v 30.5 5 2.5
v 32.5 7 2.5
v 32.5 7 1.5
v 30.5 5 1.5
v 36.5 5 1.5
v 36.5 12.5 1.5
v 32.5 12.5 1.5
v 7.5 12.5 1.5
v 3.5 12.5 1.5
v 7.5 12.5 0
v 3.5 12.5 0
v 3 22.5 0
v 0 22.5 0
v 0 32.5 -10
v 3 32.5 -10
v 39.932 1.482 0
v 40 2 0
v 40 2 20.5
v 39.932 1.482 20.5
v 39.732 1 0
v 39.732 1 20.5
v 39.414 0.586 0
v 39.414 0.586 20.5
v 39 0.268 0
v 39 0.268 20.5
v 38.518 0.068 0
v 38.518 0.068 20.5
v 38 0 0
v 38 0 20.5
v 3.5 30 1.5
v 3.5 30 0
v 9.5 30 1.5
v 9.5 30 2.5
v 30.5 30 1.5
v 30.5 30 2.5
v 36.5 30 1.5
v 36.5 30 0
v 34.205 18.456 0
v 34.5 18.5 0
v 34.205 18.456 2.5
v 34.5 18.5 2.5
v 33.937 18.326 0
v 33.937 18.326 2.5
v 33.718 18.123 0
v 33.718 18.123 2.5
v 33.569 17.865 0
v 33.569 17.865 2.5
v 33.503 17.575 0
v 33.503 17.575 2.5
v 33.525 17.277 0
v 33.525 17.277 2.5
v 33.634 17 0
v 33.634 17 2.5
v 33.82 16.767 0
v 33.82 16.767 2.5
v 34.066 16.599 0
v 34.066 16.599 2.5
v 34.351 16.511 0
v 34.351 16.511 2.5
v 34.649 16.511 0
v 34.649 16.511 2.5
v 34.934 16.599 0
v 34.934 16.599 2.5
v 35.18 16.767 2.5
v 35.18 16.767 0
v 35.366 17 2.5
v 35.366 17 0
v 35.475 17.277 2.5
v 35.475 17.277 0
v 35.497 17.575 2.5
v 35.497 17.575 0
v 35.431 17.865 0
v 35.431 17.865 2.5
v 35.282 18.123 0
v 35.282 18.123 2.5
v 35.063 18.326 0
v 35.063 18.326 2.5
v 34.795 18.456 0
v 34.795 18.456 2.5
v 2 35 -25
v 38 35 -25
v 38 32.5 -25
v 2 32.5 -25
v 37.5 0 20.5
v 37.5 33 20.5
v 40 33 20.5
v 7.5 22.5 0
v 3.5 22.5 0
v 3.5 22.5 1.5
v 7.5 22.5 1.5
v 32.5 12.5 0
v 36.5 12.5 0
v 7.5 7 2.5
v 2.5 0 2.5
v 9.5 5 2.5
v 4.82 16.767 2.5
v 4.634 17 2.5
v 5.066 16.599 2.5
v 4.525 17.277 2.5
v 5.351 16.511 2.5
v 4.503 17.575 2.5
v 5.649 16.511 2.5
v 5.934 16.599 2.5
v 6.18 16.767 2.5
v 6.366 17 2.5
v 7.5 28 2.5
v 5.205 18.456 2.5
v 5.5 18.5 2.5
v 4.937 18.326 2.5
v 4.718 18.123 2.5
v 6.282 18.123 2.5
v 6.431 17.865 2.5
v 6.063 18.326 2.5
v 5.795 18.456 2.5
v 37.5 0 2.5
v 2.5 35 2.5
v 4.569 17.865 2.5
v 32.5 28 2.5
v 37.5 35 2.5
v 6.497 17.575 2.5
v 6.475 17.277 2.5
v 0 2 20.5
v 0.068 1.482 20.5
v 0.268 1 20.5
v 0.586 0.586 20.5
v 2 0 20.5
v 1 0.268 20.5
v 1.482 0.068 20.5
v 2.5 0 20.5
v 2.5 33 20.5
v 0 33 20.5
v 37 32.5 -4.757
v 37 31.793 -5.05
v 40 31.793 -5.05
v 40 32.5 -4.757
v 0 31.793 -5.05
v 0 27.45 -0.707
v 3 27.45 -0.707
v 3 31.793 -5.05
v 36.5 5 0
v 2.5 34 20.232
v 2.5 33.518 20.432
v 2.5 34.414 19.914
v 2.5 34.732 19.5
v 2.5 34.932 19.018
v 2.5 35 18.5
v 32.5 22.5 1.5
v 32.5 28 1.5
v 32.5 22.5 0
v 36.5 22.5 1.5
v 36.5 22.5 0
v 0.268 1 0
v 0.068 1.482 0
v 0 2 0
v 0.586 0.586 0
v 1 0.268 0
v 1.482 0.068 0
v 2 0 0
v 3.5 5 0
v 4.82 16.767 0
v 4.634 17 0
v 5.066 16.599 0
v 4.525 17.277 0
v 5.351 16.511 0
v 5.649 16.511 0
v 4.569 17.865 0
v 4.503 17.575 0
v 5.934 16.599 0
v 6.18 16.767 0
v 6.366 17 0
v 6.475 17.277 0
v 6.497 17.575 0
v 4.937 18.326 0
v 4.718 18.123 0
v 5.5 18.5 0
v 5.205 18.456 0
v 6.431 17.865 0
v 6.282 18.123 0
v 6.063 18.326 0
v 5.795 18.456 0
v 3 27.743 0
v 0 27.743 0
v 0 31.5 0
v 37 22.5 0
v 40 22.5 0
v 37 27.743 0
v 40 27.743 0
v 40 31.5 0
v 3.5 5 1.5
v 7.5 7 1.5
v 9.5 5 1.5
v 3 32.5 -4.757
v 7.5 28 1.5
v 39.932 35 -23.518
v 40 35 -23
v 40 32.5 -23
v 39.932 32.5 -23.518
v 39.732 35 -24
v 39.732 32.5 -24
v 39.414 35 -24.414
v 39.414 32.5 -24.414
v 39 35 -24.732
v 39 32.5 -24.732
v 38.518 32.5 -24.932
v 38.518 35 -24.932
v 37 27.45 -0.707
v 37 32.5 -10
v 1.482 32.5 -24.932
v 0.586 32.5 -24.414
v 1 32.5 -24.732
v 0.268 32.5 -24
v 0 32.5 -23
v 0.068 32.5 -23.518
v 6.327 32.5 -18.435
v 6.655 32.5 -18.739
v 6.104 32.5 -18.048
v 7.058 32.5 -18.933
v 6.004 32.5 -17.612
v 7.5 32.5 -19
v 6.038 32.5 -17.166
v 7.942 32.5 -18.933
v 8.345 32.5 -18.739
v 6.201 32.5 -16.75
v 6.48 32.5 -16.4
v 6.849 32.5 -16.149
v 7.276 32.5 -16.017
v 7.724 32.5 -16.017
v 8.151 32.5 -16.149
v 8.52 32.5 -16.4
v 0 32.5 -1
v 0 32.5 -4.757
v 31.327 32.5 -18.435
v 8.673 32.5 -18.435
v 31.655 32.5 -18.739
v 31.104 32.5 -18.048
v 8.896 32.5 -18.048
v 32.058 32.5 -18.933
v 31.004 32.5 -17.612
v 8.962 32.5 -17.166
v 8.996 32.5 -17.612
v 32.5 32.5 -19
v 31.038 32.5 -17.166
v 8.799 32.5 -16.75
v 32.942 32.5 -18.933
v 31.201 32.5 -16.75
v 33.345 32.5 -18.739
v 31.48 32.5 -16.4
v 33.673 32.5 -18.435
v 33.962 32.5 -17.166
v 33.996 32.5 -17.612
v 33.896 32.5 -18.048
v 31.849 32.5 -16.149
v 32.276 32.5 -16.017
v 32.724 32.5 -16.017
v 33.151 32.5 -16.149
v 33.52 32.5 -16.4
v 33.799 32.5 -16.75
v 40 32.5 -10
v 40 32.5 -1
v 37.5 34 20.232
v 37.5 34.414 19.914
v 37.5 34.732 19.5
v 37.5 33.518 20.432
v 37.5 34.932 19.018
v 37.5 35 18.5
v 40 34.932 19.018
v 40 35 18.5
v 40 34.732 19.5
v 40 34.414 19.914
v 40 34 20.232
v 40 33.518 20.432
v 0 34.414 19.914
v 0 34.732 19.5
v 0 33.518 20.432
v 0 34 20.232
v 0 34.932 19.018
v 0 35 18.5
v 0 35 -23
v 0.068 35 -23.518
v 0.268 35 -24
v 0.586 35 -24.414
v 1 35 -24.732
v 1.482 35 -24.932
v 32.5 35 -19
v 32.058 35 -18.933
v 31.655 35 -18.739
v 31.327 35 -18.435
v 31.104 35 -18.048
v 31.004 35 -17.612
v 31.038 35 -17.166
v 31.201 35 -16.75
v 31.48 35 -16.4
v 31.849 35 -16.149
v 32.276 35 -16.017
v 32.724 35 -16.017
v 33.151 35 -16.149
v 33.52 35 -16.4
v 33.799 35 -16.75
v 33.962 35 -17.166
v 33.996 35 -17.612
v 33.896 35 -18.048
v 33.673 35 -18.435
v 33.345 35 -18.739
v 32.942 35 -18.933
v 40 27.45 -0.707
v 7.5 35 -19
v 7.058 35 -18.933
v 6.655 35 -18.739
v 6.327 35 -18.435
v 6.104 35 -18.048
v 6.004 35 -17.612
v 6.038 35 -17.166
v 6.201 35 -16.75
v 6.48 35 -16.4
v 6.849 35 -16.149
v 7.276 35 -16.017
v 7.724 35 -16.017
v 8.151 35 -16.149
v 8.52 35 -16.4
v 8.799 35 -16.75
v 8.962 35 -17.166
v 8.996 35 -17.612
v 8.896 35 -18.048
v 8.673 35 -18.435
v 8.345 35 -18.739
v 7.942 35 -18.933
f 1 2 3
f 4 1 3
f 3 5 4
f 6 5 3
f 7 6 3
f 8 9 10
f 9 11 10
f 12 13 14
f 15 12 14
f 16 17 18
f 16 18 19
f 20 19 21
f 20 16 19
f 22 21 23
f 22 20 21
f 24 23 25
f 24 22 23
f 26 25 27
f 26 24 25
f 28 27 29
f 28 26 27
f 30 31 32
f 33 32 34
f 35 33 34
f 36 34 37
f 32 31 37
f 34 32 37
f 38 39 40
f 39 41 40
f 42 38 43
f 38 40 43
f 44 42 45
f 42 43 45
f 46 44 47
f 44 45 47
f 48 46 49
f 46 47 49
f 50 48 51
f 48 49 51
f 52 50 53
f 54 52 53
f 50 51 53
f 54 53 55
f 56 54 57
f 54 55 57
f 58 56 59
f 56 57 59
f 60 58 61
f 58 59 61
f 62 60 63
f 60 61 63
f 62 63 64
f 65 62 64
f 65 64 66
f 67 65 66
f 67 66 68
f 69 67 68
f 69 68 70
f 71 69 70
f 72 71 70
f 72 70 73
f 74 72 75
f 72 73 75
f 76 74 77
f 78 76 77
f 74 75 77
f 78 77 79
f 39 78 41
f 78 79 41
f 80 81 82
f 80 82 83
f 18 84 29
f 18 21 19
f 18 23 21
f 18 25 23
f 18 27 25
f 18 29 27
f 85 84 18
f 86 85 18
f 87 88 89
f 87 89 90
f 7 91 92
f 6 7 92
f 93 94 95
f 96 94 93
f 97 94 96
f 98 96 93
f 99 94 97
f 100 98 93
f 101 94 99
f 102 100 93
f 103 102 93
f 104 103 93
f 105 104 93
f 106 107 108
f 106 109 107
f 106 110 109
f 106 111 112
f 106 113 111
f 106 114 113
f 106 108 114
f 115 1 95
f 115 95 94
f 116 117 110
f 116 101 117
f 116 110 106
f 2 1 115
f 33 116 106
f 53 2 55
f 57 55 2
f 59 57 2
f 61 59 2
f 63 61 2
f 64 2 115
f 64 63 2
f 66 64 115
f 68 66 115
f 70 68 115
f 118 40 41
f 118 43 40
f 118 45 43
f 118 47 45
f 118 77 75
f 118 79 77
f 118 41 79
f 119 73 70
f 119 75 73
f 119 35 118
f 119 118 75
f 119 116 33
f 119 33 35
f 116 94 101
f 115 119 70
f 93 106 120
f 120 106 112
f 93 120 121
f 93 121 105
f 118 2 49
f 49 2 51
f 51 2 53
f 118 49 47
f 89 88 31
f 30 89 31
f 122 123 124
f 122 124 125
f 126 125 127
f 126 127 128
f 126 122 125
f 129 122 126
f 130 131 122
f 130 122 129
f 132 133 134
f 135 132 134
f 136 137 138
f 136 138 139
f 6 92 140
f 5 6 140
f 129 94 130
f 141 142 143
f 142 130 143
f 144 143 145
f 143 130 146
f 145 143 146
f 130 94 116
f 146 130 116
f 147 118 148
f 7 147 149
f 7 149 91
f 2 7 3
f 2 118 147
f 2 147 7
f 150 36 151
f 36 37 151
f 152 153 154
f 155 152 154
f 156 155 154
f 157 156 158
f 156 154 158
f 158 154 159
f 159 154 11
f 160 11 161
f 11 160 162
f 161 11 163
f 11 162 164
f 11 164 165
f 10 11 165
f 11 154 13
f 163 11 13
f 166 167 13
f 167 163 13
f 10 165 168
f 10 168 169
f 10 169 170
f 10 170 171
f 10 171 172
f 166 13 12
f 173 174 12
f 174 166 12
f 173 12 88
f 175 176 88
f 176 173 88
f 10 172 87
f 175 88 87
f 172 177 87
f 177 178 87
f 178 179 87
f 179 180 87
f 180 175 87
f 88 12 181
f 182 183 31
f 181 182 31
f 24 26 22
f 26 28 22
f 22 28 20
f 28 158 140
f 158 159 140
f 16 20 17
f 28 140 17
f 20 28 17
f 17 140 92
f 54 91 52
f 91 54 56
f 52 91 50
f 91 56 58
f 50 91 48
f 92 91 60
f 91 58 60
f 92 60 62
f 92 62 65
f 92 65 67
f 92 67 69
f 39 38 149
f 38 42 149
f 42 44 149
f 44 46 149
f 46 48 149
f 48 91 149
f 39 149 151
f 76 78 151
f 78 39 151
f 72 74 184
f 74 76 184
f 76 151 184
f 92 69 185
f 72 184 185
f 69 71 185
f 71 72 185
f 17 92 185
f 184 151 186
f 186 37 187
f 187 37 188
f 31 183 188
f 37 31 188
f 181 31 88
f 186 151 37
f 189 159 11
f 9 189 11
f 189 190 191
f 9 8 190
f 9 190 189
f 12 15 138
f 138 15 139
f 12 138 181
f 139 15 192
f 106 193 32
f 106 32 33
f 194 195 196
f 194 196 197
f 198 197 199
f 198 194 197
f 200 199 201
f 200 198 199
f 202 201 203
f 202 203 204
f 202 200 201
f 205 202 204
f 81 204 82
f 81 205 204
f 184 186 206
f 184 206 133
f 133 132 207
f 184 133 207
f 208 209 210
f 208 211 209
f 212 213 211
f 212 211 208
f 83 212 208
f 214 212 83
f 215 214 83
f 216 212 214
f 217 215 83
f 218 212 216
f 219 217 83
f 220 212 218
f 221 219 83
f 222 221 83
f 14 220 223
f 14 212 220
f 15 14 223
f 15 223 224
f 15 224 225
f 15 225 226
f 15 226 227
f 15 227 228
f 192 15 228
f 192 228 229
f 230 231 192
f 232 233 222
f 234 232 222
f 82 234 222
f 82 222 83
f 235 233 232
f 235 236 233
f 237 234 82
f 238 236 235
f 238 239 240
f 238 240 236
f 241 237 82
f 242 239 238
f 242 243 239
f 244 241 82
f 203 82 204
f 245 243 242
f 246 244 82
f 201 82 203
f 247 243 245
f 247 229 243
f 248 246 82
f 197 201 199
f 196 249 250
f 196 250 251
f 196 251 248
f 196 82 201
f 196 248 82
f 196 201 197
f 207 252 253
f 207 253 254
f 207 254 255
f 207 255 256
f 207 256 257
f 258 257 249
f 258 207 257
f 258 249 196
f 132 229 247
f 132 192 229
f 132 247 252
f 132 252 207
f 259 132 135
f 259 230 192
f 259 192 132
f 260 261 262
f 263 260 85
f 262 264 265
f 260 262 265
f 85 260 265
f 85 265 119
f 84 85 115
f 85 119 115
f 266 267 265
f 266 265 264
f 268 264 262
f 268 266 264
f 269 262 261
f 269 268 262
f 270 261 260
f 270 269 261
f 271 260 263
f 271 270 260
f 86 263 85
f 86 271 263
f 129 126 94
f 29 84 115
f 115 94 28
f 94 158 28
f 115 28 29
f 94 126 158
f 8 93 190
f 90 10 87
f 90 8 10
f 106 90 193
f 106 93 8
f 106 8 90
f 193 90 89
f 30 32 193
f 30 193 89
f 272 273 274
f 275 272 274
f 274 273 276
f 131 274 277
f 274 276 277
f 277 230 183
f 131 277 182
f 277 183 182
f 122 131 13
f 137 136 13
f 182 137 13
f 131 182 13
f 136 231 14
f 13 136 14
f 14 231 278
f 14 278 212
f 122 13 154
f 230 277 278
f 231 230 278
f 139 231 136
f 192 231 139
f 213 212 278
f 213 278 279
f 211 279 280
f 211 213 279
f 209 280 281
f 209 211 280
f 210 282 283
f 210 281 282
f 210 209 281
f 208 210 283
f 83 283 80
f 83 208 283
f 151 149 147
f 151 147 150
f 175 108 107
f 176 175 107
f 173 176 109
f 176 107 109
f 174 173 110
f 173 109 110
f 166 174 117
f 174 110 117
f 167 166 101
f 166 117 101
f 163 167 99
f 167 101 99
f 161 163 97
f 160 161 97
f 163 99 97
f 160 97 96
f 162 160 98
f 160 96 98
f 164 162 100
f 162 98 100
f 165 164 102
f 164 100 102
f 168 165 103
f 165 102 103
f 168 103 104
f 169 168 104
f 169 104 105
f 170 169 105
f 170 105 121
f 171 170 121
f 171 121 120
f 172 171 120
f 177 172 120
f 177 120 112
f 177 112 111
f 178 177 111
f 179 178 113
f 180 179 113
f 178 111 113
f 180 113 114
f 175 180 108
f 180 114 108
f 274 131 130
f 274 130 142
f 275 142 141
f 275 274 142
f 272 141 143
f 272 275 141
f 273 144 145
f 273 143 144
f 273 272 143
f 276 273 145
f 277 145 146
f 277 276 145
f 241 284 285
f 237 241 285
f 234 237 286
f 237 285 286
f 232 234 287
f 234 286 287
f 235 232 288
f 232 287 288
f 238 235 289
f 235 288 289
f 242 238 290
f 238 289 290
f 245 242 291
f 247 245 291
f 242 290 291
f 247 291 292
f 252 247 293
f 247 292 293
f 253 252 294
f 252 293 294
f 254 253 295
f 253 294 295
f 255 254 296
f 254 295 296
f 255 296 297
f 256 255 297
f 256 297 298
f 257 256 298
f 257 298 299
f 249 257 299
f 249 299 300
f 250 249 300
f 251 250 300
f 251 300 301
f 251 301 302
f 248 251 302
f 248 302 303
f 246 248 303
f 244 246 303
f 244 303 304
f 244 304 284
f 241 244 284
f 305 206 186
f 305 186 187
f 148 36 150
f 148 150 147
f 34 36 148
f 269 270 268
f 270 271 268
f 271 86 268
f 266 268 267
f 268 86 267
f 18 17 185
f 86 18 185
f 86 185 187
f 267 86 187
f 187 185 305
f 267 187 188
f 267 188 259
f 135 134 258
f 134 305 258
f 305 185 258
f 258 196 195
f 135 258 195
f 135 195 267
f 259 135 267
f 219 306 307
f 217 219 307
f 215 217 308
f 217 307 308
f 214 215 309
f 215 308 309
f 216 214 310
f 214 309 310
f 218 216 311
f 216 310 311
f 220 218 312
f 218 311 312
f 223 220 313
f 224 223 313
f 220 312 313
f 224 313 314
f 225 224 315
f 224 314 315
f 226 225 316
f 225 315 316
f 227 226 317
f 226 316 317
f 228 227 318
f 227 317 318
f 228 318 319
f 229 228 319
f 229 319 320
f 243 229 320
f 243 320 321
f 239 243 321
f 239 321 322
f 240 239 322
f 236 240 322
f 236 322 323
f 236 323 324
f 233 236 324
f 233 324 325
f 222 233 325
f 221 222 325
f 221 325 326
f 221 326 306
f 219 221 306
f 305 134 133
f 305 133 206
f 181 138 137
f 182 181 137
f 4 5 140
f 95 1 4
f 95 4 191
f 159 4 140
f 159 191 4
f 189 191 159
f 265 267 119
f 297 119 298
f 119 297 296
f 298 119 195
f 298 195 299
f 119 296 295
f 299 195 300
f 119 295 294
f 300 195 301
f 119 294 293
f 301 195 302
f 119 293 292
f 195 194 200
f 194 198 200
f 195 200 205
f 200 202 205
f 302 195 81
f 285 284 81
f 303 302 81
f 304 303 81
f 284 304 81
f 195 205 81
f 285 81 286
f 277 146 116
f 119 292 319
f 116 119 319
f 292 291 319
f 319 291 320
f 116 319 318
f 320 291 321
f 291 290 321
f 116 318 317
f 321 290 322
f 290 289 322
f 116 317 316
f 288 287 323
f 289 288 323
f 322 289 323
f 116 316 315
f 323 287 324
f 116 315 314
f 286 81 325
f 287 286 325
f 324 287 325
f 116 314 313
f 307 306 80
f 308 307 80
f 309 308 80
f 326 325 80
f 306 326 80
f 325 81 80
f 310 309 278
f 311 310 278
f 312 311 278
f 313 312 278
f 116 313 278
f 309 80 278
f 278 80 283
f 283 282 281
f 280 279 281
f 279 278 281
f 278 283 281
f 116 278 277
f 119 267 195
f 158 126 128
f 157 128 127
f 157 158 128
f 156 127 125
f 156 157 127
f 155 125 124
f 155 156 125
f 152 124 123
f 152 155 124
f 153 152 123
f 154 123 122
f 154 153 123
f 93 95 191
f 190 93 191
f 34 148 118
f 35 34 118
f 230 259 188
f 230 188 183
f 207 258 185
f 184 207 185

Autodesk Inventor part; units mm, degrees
ref_plane "YZ Plane" through (0, 0, 0) normal (1, 0, 0) x (0, 1, 0)
ref_plane "XZ Plane" through (0, 0, 0) normal (0, 1, 0) x (-1, 0, 0)
sketch "Sketch1" plane through (0, 0, 0) normal (0, 0, 1) x (1, 0, 0)
  line L0 (0, 0) -> (40, 0)
  line L1 (40, 0) -> (40, 35)
  line L2 (40, 35) -> (0, 35)
  line L3 (0, 35) -> (0, 0)
  dimension "d0" = 35
  dimension "d1" = 40
extrude "Extrusion1" add sketch "Sketch1" along normal blind 2.5
sketch "Sketch2" plane through (0, 0, 2.5) normal (0, 0, 1) x (1, 0, 0)
  line L0 (7.5, 30) -> (32.5, 30)
  line L1 (32.5, 30) -> (32.5, 5)
  line L2 (32.5, 5) -> (7.5, 5)
  line L3 (7.5, 5) -> (7.5, 30)
  line L4 (0, 0) -> (40, 0) projected
  line L5 (0, 35) -> (0, 0) projected
  point P0 (20, 30)
  point P1 (20, 0)
  point P2 (7.5, 17.5)
  point P3 (0, 17.5)
  dimension "d4" = 25
extrude "Extrusion2" cut sketch "Sketch2" against normal through all
sketch "Sketch3" plane through (0, 0, 0) normal (0, 0, -1) x (-1, 0, 0)
  line L0 (-5.5, 17.5) -> (-34.5, 17.5)
  line L1 (0, 0) -> (-40, 0) projected
  line L2 (0, 35) -> (0, 0) projected
  point P0 (-20, 17.5)
  point P1 (-20, 0)
  point P2 (0, 17.5)
  dimension "d7" = 29
hole "Hole1" at (5.5, 17.5, 0) at (34.5, 17.5, 0) direction (0, 0, 1) diameter 2 end through all
sketch "Sketch4" plane through (0, 0, 0) normal (0, 0, -1) x (-1, 0, 0)
  line L0 (-40, 0) -> (-40, 35) projected
  line L1 (0, 35) -> (0, 0) projected
  line L2 (-40, 35) -> (0, 35)
  line L3 (0, 35) -> (0, 32.5)
  line L4 (0, 32.5) -> (-40, 32.5)
  line L5 (-40, 32.5) -> (-40, 35)
  dimension "d15" = 2.5
extrude "Extrusion3" add sketch "Sketch4" along normal blind 25
fillet "Fillet1" radius 2 4 edges at (40, 0, 1.25) (0, 0, 1.25) (0, 33.75, -25) (40, 33.75, -25)
chamfer "Chamfer1" distance 2 angle 45 4 edges at (7.5, 30, 1.25) (32.5, 30, 1.25) (32.5, 5, 1.25) (7.5, 5, 1.25)
sketch "Sketch5" plane through (40, 2, 0) normal (1, 0, 0) x (0, 0, -1)
  line L0 (0, 30.5) -> (23, 30.5) projected
  line L1 (10, 30.5) -> (0, 20.5)
  line L2 (0, 0) -> (0, 30.5) projected
  line L3 (7.8787, 32.6213) -> (-2.1213, 22.6213)
  point P0 (0, -2)
  point P1 (5.7574, 30.5)
  point P2 (0, 24.7426)
  dimension "d22" = 10
  dimension "d23" = 10
  dimension "d24" = 3
extrude "Extrusion4" add sketch "Sketch5" against normal blind 3 contours L0 L1 L2 L3
ref_plane "Work Plane1" through (20, 2, 2.5) normal (1, 0, 0) x (0, 0, -1)
mirror "Mirror1" about plane through (20, 2, 2.5) normal (1, 0, 0) of "Extrusion4"
sketch "Sketch6" plane through (0, 32.5, 0) normal (0, -1, 0) x (1, 0, 0)
  line L0 (7.5, -17.5) -> (32.5, -17.5)
  line L1 (38, -25) -> (2, -25) projected
  point P0 (0, 0)
  point P1 (20, -17.5)
  point P2 (20, -25)
  dimension "d27" = 25
  dimension "d28" = 7.5
hole "Hole2" at (7.5, 32.5, -17.5) at (32.5, 32.5, -17.5) direction (0, 1, 0) diameter 3 end through all
chamfer "Chamfer2" distance 1 angle 45 5 edges at (20, 32.5, 0) (1.5, 32.5, -5.7574) (1.5, 26.7426, 0) (38.5, 32.5, -5.7574) (38.5, 26.7426, 0)
sketch "Sketch7" plane through (0, 0, 0) normal (0, 0, -1) x (-1, 0, 0)
  line L0 (-30.5, 30) -> (-9.5, 30) projected
  line L1 (-30.5, 30) -> (-36.5, 30)
  line L2 (-36.5, 30) -> (-36.5, 5)
  line L3 (-36.5, 5) -> (-30.5, 5)
  line L4 (-32.5, 7) -> (-30.5, 5) projected
  line L5 (-32.5, 7) -> (-32.5, 28) projected
  line L6 (-30.5, 30) -> (-32.5, 28) projected
  line L7 (-32.5, 22.5) -> (-36.5, 22.5)
  line L8 (-32.5, 12.5) -> (-36.5, 12.5)
  line L9 (-34.5, 22.5) -> (-34.5, 12.5) construction
  point P0 (0, 0)
  point P1 (-34.5, 17.5)
  point P2 (-32.5, 17.5)
  dimension "d39" = 6
  dimension "d40" = 10
extrude "Extrusion5" cut sketch "Sketch7" against normal blind 1.5 contours L6 L5 L7 L2 L1 | L8 L5 L4 L3 L2
mirror "Mirror2" about plane through (20, 2, 2.5) normal (1, 0, 0) of "Extrusion5"
sketch "Sketch8" plane through (0, 0, 2.5) normal (0, 0, 1) x (1, 0, 0)
  line L0 (0, 35) -> (0, 2) projected
  arc A0 (0, 2) -> (2, 0) centre (2, 2) ccw projected
  line L1 (2, 0) -> (2.5, 0)
  line L2 (2, 0) -> (38, 0) projected
  line L3 (2.5, 0) -> (2.5, 35)
  line L4 (0, 32.5) -> (0, 35) projected
  line L5 (2.5, 35) -> (0, 35)
  point P0 (0, 0)
  dimension "d43" = 0.5
extrude "Extrusion6" add sketch "Sketch8" along normal blind 18
fillet "Fillet2" radius 2 1 edges at (1.25, 35, 20.5)
mirror "Mirror3" about plane through (20, 2, 2.5) normal (1, 0, 0) of "Extrusion6", "Fillet2"
properties part number "PIR mount"
